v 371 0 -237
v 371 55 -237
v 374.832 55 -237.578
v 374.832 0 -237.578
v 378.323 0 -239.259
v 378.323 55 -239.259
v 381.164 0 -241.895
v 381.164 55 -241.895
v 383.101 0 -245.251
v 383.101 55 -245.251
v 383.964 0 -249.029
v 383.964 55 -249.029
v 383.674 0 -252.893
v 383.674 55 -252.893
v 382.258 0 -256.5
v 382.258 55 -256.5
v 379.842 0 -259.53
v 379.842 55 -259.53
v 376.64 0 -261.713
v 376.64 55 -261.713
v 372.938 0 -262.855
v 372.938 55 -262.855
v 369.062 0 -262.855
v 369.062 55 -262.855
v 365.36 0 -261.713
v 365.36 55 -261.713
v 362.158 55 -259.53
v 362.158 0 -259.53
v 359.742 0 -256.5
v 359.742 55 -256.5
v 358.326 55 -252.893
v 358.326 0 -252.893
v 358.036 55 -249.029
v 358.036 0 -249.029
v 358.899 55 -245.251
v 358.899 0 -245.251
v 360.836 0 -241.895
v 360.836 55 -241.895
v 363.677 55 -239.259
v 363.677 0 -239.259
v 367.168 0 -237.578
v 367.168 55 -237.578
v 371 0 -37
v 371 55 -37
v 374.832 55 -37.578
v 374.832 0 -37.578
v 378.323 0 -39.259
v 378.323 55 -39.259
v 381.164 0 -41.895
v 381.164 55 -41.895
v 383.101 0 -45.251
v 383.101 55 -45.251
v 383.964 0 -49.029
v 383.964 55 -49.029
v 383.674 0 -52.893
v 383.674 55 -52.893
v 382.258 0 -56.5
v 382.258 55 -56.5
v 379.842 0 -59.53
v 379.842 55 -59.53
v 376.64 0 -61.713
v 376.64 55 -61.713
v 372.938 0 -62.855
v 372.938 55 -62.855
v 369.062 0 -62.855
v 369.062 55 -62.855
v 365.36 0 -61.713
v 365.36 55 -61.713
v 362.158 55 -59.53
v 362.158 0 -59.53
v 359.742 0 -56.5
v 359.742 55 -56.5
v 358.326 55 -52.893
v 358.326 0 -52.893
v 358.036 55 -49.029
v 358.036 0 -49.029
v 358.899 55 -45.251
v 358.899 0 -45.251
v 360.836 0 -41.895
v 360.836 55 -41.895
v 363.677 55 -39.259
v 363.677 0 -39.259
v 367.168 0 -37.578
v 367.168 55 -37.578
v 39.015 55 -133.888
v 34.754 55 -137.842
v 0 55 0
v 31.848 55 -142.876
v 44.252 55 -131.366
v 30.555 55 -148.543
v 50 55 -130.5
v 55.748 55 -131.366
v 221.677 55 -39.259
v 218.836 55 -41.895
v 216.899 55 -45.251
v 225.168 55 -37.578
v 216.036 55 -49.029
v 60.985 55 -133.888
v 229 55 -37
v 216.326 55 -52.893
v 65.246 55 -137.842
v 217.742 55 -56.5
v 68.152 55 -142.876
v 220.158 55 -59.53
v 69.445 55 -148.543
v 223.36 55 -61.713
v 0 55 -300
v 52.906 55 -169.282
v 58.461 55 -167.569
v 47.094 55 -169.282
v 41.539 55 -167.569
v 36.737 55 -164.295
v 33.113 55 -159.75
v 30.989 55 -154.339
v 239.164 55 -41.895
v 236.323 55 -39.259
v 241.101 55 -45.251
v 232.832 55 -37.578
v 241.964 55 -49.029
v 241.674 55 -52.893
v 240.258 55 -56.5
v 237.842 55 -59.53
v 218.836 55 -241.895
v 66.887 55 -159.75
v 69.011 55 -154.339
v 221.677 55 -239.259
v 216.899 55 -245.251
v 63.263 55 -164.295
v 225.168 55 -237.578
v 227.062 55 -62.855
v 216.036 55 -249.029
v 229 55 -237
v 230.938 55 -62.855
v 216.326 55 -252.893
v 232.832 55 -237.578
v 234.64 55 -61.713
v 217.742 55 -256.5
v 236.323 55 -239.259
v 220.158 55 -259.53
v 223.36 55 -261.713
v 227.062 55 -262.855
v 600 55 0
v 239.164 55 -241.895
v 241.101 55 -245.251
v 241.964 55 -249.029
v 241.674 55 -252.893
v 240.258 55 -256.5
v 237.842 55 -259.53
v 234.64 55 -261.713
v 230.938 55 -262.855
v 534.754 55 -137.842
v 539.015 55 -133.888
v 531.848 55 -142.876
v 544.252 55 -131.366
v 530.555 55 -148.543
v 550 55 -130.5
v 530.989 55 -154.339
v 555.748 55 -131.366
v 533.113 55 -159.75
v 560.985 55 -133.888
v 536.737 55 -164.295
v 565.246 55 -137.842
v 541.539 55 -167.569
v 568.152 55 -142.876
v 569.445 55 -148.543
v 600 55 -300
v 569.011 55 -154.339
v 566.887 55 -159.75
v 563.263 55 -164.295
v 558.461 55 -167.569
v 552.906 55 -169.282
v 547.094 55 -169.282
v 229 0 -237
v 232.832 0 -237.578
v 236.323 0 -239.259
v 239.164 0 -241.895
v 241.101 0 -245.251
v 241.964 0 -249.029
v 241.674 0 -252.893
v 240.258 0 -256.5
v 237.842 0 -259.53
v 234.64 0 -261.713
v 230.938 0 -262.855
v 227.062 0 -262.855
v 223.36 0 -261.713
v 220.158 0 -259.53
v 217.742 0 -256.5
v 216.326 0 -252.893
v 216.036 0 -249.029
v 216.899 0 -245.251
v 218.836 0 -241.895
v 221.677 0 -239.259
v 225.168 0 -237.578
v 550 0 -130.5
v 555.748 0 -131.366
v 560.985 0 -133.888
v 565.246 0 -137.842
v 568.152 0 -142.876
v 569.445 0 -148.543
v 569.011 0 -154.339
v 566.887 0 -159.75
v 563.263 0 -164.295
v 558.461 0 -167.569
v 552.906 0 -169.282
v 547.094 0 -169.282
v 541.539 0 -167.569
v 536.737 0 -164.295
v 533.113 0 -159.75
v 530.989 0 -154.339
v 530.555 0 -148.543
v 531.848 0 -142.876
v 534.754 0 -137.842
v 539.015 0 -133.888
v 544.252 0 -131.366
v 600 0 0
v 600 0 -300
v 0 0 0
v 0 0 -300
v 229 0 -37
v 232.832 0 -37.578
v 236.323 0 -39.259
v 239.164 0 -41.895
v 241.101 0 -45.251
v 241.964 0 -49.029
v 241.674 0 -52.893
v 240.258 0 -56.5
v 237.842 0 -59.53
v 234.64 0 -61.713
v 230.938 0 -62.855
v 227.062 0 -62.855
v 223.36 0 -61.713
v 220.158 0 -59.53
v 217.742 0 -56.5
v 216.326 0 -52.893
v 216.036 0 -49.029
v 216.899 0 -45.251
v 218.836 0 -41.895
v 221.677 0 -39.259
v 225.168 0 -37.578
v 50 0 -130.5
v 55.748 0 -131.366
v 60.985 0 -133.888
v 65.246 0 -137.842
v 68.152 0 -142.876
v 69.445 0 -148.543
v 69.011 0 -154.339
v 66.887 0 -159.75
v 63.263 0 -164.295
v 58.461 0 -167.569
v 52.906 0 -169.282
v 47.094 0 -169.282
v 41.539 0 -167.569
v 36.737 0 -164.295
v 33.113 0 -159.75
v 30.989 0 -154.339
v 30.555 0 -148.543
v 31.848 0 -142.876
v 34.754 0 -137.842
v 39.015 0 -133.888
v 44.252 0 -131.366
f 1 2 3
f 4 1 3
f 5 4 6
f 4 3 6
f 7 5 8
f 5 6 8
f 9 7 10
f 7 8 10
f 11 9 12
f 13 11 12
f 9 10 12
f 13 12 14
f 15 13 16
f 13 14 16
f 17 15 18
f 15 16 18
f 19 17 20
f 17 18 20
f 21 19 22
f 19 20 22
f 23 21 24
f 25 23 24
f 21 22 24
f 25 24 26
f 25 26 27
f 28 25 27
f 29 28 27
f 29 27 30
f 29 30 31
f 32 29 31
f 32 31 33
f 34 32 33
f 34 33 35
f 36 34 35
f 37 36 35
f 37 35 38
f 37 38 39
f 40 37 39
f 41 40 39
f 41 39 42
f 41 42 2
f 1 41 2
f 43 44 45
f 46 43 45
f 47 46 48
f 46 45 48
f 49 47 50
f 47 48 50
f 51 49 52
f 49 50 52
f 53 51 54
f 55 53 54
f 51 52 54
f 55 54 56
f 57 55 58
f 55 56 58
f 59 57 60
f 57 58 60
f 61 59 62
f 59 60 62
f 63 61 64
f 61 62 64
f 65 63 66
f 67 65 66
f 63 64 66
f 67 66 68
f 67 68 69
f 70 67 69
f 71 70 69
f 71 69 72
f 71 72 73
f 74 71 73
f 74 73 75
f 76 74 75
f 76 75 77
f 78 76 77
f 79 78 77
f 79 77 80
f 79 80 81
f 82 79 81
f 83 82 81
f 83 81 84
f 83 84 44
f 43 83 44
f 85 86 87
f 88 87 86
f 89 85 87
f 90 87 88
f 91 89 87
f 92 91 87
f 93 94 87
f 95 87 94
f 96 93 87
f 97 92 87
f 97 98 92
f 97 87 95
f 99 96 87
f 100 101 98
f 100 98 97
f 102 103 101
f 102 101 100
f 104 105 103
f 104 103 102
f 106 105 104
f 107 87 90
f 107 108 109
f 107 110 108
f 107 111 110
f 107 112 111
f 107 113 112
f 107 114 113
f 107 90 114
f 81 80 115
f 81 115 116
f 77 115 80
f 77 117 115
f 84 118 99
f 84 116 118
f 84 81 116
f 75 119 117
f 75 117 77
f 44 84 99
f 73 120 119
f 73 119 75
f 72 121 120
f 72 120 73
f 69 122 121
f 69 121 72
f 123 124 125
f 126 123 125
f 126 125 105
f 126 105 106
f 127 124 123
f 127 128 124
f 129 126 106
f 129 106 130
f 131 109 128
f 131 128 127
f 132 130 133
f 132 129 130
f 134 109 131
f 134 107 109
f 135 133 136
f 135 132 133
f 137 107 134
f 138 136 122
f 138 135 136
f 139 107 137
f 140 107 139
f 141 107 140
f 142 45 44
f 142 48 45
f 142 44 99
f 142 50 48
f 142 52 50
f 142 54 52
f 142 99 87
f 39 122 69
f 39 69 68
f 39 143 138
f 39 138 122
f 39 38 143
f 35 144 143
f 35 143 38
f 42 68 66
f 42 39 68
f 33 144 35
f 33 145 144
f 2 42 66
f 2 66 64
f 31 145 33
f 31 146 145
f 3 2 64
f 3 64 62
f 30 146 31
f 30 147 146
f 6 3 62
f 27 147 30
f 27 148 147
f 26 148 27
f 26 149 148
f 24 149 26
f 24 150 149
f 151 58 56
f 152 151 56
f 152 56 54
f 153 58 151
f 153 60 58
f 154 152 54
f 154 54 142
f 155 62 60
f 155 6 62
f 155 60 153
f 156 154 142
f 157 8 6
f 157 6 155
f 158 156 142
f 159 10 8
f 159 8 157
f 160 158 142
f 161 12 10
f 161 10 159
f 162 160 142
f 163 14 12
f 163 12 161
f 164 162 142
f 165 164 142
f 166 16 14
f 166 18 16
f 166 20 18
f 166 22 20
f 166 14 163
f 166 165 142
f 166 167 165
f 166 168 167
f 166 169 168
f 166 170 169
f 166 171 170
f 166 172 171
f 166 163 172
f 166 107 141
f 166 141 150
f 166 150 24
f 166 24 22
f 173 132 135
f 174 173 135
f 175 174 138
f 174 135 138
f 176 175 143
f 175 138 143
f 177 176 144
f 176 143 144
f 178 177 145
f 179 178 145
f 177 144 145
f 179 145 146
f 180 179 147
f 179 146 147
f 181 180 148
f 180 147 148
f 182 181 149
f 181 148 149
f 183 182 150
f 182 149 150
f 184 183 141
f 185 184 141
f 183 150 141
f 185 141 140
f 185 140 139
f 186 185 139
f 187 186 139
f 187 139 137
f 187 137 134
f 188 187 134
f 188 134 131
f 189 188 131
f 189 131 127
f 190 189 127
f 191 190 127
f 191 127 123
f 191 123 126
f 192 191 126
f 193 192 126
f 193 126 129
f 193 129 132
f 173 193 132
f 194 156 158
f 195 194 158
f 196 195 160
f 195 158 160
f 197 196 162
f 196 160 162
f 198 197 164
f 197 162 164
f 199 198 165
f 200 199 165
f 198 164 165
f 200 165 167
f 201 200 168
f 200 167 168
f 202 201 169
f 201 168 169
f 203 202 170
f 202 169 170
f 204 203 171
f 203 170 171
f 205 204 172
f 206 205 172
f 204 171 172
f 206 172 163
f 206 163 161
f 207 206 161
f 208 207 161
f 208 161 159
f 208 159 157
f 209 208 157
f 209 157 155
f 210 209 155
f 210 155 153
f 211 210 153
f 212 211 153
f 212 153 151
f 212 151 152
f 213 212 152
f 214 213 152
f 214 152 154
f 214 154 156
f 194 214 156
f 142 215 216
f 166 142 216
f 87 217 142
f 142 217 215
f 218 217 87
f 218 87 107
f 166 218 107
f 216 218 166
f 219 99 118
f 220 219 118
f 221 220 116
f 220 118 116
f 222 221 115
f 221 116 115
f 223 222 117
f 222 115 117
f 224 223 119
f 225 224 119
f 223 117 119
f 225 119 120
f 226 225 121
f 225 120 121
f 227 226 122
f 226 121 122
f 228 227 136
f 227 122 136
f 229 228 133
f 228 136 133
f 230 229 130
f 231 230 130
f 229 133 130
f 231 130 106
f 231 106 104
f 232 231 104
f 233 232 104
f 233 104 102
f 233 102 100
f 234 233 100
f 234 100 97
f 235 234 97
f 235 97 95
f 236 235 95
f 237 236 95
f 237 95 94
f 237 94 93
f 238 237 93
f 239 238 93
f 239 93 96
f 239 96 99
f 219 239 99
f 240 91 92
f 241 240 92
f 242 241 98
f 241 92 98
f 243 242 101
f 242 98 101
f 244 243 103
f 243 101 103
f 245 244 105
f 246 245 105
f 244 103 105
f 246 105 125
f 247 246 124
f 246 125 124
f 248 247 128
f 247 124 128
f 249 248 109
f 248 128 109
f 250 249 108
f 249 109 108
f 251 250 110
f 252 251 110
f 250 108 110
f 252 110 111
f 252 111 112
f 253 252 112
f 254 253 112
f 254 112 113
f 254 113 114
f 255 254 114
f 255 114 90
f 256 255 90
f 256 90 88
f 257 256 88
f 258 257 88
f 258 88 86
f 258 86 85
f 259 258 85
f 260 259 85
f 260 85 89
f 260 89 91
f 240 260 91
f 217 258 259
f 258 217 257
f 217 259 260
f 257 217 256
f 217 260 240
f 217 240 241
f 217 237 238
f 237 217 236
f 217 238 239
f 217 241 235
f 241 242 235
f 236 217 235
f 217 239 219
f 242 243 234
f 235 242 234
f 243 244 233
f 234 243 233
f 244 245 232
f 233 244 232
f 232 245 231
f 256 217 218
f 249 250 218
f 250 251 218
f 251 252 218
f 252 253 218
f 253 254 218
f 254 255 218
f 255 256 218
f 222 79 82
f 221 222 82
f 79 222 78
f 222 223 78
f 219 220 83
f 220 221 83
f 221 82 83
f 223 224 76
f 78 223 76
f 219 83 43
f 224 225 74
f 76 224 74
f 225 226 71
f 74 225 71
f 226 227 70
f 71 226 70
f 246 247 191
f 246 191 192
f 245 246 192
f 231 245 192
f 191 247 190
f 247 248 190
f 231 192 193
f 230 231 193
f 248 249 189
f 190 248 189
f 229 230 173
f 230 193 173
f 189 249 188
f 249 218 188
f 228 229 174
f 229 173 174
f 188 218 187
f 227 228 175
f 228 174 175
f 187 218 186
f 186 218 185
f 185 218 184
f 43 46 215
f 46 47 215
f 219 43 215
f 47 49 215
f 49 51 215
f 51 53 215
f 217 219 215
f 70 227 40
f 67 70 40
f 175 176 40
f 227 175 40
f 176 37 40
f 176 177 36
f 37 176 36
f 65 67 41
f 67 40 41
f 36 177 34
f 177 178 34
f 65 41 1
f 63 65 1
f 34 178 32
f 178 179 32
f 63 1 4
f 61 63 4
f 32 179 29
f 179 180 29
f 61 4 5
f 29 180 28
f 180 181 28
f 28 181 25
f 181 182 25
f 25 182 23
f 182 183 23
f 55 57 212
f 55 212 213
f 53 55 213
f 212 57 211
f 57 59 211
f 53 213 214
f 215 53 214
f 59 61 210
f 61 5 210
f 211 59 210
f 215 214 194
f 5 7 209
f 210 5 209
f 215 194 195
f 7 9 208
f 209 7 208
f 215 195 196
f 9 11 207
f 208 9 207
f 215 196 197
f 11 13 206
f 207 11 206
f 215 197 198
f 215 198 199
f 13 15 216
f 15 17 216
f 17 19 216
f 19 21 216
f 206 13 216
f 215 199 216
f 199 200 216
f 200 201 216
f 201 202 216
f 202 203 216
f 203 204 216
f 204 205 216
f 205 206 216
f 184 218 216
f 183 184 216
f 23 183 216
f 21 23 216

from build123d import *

# Parameters (mm, degrees)
SKETCH_1_W          = 600
SKETCH_1_H          = 300
EXTRUDE_1_DEPTH     = 55
SKETCH_2_R          = 19.5
SKETCH_2_R_2        = 13
CUT_EXTRUDE_1_DEPTH = 674.071318658


with BuildPart() as part:
    # 草图1 → 凸台-拉伸1 (new body)
    with BuildSketch(Plane(origin=(0, 0, 0), x_dir=(1, 0, 0), z_dir=(0, 1, 0))):
        with Locations((300, 150)):
            Rectangle(SKETCH_1_W, SKETCH_1_H)
    extrude(amount=EXTRUDE_1_DEPTH)

    # 草图2 → 切除-拉伸1 (cut, through all)
    with BuildSketch(Plane(origin=(0, 55, 0), x_dir=(1, 0, 0), z_dir=(0, 1, 0))):
        with Locations(Location((50, 150, 0), (0, 0, 270))):
            Circle(SKETCH_2_R)
        with Locations(Location((550, 150, 0), (0, 0, 270))):
            Circle(SKETCH_2_R)
        with Locations(Location((371, 250, 0), (0, 0, 270))):
            Circle(SKETCH_2_R_2)
        with Locations(Location((229, 250, 0), (0, 0, 270))):
            Circle(SKETCH_2_R_2)
        with Locations(Location((371, 50, 0), (0, 0, 270))):
            Circle(SKETCH_2_R_2)
        with Locations(Location((229, 50, 0), (0, 0, 270))):
            Circle(SKETCH_2_R_2)
    extrude(amount=-CUT_EXTRUDE_1_DEPTH, mode=Mode.SUBTRACT)


solid = part.part
